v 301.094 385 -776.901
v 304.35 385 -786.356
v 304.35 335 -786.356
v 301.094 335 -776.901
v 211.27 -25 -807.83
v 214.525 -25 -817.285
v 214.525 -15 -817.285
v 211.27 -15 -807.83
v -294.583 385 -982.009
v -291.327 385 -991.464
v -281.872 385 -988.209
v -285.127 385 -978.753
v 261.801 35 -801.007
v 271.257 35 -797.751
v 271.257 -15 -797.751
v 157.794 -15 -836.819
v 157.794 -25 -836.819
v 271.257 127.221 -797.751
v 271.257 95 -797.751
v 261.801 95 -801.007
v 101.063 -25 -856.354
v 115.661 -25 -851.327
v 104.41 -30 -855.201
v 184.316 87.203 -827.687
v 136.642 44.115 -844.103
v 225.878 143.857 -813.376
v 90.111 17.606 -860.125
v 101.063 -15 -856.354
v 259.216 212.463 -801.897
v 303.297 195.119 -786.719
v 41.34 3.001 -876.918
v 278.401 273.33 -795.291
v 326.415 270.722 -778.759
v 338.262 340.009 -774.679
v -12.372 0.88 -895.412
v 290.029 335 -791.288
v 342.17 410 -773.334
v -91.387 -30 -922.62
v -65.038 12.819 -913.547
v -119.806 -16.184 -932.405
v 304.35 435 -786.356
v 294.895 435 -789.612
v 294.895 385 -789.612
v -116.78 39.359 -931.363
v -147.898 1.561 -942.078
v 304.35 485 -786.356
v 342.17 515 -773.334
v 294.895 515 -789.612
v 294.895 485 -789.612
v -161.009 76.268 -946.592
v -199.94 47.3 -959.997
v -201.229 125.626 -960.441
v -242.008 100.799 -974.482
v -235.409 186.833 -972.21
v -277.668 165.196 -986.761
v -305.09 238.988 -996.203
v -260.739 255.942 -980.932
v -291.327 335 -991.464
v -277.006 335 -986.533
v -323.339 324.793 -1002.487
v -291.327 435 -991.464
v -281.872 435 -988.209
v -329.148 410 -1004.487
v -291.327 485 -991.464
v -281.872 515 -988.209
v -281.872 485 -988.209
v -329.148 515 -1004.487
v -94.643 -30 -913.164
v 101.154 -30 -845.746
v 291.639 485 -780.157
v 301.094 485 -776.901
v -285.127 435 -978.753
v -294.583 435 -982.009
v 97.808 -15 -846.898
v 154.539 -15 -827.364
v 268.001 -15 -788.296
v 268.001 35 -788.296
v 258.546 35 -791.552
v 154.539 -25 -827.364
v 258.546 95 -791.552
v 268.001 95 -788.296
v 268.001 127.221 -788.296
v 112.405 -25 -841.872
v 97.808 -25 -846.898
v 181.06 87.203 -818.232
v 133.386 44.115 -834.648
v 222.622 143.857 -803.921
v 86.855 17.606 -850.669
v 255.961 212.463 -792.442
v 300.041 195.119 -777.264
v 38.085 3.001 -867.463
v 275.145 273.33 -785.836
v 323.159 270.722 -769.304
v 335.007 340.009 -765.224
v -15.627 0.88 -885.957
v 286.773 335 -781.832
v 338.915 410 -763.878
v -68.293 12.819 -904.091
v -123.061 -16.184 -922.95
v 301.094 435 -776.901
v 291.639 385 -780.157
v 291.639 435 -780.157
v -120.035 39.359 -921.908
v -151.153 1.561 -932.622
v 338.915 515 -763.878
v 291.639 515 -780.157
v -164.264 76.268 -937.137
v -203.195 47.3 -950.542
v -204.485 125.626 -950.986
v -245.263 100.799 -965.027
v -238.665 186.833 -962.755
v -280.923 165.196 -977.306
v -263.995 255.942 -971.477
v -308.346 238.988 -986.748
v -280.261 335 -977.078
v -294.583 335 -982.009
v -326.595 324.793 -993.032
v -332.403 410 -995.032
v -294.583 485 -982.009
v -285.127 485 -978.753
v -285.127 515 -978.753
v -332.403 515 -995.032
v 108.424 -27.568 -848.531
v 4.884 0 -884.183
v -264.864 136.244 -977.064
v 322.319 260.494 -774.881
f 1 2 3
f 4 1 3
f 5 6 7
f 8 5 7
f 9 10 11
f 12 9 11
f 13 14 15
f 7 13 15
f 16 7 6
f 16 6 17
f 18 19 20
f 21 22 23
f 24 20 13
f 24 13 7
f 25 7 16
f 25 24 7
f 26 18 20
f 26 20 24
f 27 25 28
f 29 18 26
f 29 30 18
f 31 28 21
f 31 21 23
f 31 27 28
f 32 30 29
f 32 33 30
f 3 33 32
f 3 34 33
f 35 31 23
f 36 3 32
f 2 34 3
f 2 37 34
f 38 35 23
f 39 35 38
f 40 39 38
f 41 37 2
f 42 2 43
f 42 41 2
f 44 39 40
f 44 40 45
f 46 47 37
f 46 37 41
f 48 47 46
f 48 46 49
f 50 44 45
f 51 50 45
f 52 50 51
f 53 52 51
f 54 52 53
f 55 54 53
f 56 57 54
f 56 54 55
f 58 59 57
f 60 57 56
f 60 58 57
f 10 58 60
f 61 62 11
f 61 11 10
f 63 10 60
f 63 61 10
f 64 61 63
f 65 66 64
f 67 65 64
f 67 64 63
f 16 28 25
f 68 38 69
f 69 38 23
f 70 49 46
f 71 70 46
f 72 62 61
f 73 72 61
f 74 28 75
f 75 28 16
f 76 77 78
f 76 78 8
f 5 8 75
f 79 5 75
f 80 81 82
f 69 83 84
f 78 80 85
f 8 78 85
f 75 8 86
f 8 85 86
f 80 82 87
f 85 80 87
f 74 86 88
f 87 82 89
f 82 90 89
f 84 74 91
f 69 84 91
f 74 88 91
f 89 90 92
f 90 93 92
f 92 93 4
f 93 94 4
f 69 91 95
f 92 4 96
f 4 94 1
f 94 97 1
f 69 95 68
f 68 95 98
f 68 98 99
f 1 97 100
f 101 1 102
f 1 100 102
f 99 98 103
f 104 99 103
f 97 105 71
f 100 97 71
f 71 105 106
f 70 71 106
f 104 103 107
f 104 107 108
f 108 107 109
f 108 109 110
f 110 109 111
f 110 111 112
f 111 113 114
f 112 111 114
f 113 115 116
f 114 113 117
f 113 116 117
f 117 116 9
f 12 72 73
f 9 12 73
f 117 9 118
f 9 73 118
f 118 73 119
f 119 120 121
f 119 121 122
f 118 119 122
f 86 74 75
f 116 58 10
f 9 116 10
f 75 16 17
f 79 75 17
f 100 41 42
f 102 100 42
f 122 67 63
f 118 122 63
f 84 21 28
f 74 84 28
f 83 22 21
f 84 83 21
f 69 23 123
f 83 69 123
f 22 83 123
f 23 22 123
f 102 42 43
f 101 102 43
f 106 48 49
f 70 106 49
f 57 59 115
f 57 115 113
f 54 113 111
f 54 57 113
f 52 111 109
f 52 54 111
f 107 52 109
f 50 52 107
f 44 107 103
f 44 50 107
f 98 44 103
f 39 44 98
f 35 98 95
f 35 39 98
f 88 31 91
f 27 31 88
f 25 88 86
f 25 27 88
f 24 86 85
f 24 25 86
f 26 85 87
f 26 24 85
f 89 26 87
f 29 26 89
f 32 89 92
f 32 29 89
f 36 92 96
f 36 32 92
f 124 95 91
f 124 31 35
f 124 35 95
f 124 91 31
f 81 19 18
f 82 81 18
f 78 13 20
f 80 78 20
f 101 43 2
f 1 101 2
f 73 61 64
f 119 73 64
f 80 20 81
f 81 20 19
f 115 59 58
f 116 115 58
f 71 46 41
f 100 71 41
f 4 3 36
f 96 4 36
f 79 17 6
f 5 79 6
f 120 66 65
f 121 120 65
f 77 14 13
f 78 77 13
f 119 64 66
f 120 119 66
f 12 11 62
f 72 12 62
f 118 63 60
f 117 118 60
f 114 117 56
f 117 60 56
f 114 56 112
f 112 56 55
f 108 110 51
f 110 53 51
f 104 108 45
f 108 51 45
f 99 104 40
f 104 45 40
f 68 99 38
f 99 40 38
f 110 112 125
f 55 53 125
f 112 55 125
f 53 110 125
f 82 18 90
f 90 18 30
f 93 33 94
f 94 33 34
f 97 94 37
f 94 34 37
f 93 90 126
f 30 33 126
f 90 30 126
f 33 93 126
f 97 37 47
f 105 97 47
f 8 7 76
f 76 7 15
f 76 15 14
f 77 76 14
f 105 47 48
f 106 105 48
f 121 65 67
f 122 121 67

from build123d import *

# Parameters (mm, degrees)
BOSS_EXTRUDE1_DEPTH = 10


with BuildPart() as part:
    # Sketch4 → Boss-Extrude1 (new body)
    with BuildSketch(Plane(origin=(274.324104856, 0, -796.695049331), x_dir=(0.945518576, 0, 0.325568154), z_dir=(-0.325568154, 0, 0.945518576))):
        with BuildLine():
            Line((21.755705622, 335), (16.60929745, 335))
            add(Edge.make_bspline(
                [(-583.097886205, 335), (-536.728774067, 0), (-283.244294378, 0), (-29.759814689, 0), (16.60929745, 335)],
                knots=[4.896351675, 4.896351675, 4.896351675, 6.283185307, 6.283185307, 7.67001894, 7.67001894, 7.67001894], degree=2, weights=[1, 0.769066587, 1, 0.769066587, 1]))
            Line((-583.097886205, 335), (-588.244294378, 335))
            Line((-588.244294378, 335), (-598.244294378, 335))
            Line((-598.244294378, 335), (-598.244294378, 385))
            Line((-598.244294378, 385), (-588.244294378, 385))
            Line((-588.244294378, 385), (-588.244294378, 435))
            Line((-588.244294378, 435), (-598.244294378, 435))
            Line((-598.244294378, 435), (-598.244294378, 485))
            Line((-598.244294378, 485), (-588.244294378, 485))
            Line((-588.244294378, 485), (-588.244294378, 515))
            Line((-588.244294378, 515), (-638.244294378, 515))
            Line((-638.244294378, 515), (-638.244294378, 410))
            add(Edge.make_bspline(
                [(-638.244294378, 410), (-638.244294378, 69.353354952), (-386.783963771, -30)],
                knots=[1.570796327, 1.570796327, 1.570796327, 2.845629732, 2.845629732, 2.845629732], degree=2, weights=[1, 0.803635813, 1]))
            Line((-386.783963771, -30), (-179.704624985, -30))
            add(Edge.make_bspline(
                [(-179.704624985, -30), (-173.721030113, -27.635848868), (-167.805430637, -25)],
                knots=[3.437555575, 3.437555575, 3.437555575, 3.472794612, 3.472794612, 3.472794612], degree=2, weights=[1, 0.99984478, 1]))
            Line((-167.805430637, -25), (-183.244294378, -25))
            Line((-183.244294378, -25), (-183.244294378, -15))
            Line((-183.244294378, -15), (-123.244294378, -15))
            Line((-123.244294378, -15), (-123.244294378, -25))
            Line((-123.244294378, -25), (-63.244294378, -25))
            Line((-63.244294378, -25), (-63.244294378, -15))
            Line((-63.244294378, -15), (-3.244294378, -15))
            Line((-3.244294378, -15), (-3.244294378, 35))
            Line((-3.244294378, 35), (-13.244294378, 35))
            Line((-13.244294378, 35), (-13.244294378, 95))
            Line((-13.244294378, 95), (-3.244294378, 95))
            Line((-3.244294378, 95), (-3.244294378, 127.221118093))
            add(Edge.make_bspline(
                [(-3.244294378, 127.221118093), (71.755705622, 251.911018777), (71.755705622, 410)],
                knots=[4.050336884, 4.050336884, 4.050336884, 4.71238898, 4.71238898, 4.71238898], degree=2, weights=[1, 0.945709362, 1]))
            Line((71.755705622, 410), (71.755705622, 515))
            Line((71.755705622, 515), (21.755705622, 515))
            Line((21.755705622, 515), (21.755705622, 485))
            Line((21.755705622, 485), (31.755705622, 485))
            Line((31.755705622, 485), (31.755705622, 435))
            Line((31.755705622, 435), (21.755705622, 435))
            Line((21.755705622, 435), (21.755705622, 385))
            Line((21.755705622, 385), (31.755705622, 385))
            Line((31.755705622, 385), (31.755705622, 335))
            Line((31.755705622, 335), (21.755705622, 335))
        make_face()
    extrude(amount=BOSS_EXTRUDE1_DEPTH)


solid = part.part
